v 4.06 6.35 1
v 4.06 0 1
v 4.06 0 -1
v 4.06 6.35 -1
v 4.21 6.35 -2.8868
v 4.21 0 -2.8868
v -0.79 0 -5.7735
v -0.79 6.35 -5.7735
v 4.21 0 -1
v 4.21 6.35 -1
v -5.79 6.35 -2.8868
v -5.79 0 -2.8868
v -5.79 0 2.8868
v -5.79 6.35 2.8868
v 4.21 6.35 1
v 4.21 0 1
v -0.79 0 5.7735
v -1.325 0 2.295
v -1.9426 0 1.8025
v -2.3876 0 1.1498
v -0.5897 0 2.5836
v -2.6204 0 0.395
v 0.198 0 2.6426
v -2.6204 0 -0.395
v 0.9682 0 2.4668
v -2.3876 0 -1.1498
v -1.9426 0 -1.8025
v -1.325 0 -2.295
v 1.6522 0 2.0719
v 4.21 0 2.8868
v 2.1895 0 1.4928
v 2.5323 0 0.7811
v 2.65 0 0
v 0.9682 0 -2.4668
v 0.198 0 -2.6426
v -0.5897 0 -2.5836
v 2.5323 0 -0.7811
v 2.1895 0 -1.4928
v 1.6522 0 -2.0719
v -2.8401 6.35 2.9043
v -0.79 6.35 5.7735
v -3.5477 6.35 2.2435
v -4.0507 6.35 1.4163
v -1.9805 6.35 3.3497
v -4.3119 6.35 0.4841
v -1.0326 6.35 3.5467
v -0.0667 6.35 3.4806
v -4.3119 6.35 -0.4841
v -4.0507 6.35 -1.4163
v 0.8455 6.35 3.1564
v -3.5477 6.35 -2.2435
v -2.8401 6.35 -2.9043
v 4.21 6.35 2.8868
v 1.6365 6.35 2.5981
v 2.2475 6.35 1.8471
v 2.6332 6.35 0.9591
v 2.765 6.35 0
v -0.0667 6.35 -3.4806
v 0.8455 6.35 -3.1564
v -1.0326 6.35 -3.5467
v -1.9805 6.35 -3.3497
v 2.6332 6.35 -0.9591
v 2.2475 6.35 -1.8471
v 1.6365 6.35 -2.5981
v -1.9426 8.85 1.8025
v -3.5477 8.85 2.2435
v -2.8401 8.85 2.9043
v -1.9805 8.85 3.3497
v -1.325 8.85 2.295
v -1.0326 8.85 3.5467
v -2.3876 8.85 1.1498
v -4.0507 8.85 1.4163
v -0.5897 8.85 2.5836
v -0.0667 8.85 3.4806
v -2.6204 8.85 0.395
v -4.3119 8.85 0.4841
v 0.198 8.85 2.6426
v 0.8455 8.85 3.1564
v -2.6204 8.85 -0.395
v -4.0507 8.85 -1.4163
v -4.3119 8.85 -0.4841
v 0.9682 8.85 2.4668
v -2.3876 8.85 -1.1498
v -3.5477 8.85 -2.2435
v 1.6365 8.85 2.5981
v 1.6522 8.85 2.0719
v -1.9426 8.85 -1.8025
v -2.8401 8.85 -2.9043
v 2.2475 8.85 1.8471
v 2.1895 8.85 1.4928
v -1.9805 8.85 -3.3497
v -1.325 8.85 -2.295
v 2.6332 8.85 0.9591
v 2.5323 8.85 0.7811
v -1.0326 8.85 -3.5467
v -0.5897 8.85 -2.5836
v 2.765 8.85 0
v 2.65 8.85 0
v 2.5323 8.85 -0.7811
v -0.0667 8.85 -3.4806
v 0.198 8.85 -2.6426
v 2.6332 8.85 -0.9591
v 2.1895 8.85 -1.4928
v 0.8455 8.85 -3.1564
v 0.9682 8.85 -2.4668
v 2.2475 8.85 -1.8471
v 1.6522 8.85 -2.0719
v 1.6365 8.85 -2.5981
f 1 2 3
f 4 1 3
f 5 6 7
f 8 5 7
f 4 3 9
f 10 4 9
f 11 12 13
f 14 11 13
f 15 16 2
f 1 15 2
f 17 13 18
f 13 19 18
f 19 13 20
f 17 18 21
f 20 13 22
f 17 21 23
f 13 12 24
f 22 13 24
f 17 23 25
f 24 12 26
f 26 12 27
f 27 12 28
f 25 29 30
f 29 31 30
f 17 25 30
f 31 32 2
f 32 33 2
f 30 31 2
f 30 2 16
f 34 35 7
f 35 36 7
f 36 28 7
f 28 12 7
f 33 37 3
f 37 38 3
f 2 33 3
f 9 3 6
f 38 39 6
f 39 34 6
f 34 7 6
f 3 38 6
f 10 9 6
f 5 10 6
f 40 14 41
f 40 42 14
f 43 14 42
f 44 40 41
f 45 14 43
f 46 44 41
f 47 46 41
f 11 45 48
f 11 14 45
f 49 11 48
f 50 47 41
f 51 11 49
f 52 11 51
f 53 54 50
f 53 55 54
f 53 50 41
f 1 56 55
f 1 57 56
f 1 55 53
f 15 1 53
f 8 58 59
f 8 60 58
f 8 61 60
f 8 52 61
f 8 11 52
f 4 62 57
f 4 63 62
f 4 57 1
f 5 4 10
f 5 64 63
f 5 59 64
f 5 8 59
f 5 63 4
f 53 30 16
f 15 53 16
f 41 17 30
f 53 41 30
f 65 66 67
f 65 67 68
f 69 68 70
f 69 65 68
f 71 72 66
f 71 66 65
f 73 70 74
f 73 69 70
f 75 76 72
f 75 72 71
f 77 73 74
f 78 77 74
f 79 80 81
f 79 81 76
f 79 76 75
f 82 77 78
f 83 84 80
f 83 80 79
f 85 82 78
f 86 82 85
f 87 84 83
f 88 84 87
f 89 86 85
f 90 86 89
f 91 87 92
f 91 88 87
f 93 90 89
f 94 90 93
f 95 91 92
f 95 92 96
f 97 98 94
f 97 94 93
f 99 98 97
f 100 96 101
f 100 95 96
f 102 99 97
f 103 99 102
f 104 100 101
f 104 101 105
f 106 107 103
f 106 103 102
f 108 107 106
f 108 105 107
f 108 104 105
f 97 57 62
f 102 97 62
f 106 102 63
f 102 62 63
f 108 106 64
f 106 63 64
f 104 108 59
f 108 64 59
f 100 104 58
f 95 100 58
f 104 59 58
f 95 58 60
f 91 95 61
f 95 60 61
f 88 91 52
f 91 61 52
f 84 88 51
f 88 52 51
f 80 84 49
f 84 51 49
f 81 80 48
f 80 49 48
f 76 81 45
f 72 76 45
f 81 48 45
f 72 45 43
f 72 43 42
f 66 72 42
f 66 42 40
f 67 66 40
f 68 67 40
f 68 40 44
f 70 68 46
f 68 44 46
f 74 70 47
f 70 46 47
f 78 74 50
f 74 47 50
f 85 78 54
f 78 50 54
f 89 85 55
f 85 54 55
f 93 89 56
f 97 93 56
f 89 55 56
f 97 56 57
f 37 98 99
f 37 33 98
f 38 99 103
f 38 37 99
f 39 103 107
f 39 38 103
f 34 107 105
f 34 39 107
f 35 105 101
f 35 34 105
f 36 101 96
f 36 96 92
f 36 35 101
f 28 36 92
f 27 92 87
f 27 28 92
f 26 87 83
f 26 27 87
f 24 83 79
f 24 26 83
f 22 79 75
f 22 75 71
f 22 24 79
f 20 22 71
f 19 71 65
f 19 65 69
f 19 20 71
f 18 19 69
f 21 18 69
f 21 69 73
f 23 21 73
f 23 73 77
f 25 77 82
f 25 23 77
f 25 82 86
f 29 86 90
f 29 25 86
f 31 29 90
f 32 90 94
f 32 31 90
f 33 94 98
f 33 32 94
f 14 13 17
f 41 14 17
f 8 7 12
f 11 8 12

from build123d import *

# Parameters (mm, degrees)
SKETCH1_R           = 2.65
BOSS_EXTRUDE1_DEPTH = 6.35
SKETCH2_R           = 3.555
SKETCH2_R_2         = 2.65
BOSS_EXTRUDE2_DEPTH = 2.5


with BuildPart() as part:
    # Sketch1 → Boss-Extrude1 (new body)
    with BuildSketch(Plane(origin=(0, 0, 0), x_dir=(1, 0, 0), z_dir=(0, 1, 0))):
        Polygon((4.21, 2.886751346), (-0.79, 5.773502692), (-5.79, 2.886751346), (-5.79, -2.886751346), (-0.79, -5.773502692), (4.21, -2.886751346), (4.21, -1), (4.06, -1), (4.06, 1), (4.21, 1), align=None)
        Circle(SKETCH1_R, mode=Mode.SUBTRACT)
    extrude(amount=BOSS_EXTRUDE1_DEPTH)

    # Sketch2 → Boss-Extrude2 (add)
    with BuildSketch(Plane(origin=(0, 6.35, 0), x_dir=(1, 0, 0), z_dir=(0, 1, 0))):
        with Locations((-0.79, 0)):
            Circle(SKETCH2_R)
        Circle(SKETCH2_R_2, mode=Mode.SUBTRACT)
    extrude(amount=BOSS_EXTRUDE2_DEPTH)


solid = part.part
